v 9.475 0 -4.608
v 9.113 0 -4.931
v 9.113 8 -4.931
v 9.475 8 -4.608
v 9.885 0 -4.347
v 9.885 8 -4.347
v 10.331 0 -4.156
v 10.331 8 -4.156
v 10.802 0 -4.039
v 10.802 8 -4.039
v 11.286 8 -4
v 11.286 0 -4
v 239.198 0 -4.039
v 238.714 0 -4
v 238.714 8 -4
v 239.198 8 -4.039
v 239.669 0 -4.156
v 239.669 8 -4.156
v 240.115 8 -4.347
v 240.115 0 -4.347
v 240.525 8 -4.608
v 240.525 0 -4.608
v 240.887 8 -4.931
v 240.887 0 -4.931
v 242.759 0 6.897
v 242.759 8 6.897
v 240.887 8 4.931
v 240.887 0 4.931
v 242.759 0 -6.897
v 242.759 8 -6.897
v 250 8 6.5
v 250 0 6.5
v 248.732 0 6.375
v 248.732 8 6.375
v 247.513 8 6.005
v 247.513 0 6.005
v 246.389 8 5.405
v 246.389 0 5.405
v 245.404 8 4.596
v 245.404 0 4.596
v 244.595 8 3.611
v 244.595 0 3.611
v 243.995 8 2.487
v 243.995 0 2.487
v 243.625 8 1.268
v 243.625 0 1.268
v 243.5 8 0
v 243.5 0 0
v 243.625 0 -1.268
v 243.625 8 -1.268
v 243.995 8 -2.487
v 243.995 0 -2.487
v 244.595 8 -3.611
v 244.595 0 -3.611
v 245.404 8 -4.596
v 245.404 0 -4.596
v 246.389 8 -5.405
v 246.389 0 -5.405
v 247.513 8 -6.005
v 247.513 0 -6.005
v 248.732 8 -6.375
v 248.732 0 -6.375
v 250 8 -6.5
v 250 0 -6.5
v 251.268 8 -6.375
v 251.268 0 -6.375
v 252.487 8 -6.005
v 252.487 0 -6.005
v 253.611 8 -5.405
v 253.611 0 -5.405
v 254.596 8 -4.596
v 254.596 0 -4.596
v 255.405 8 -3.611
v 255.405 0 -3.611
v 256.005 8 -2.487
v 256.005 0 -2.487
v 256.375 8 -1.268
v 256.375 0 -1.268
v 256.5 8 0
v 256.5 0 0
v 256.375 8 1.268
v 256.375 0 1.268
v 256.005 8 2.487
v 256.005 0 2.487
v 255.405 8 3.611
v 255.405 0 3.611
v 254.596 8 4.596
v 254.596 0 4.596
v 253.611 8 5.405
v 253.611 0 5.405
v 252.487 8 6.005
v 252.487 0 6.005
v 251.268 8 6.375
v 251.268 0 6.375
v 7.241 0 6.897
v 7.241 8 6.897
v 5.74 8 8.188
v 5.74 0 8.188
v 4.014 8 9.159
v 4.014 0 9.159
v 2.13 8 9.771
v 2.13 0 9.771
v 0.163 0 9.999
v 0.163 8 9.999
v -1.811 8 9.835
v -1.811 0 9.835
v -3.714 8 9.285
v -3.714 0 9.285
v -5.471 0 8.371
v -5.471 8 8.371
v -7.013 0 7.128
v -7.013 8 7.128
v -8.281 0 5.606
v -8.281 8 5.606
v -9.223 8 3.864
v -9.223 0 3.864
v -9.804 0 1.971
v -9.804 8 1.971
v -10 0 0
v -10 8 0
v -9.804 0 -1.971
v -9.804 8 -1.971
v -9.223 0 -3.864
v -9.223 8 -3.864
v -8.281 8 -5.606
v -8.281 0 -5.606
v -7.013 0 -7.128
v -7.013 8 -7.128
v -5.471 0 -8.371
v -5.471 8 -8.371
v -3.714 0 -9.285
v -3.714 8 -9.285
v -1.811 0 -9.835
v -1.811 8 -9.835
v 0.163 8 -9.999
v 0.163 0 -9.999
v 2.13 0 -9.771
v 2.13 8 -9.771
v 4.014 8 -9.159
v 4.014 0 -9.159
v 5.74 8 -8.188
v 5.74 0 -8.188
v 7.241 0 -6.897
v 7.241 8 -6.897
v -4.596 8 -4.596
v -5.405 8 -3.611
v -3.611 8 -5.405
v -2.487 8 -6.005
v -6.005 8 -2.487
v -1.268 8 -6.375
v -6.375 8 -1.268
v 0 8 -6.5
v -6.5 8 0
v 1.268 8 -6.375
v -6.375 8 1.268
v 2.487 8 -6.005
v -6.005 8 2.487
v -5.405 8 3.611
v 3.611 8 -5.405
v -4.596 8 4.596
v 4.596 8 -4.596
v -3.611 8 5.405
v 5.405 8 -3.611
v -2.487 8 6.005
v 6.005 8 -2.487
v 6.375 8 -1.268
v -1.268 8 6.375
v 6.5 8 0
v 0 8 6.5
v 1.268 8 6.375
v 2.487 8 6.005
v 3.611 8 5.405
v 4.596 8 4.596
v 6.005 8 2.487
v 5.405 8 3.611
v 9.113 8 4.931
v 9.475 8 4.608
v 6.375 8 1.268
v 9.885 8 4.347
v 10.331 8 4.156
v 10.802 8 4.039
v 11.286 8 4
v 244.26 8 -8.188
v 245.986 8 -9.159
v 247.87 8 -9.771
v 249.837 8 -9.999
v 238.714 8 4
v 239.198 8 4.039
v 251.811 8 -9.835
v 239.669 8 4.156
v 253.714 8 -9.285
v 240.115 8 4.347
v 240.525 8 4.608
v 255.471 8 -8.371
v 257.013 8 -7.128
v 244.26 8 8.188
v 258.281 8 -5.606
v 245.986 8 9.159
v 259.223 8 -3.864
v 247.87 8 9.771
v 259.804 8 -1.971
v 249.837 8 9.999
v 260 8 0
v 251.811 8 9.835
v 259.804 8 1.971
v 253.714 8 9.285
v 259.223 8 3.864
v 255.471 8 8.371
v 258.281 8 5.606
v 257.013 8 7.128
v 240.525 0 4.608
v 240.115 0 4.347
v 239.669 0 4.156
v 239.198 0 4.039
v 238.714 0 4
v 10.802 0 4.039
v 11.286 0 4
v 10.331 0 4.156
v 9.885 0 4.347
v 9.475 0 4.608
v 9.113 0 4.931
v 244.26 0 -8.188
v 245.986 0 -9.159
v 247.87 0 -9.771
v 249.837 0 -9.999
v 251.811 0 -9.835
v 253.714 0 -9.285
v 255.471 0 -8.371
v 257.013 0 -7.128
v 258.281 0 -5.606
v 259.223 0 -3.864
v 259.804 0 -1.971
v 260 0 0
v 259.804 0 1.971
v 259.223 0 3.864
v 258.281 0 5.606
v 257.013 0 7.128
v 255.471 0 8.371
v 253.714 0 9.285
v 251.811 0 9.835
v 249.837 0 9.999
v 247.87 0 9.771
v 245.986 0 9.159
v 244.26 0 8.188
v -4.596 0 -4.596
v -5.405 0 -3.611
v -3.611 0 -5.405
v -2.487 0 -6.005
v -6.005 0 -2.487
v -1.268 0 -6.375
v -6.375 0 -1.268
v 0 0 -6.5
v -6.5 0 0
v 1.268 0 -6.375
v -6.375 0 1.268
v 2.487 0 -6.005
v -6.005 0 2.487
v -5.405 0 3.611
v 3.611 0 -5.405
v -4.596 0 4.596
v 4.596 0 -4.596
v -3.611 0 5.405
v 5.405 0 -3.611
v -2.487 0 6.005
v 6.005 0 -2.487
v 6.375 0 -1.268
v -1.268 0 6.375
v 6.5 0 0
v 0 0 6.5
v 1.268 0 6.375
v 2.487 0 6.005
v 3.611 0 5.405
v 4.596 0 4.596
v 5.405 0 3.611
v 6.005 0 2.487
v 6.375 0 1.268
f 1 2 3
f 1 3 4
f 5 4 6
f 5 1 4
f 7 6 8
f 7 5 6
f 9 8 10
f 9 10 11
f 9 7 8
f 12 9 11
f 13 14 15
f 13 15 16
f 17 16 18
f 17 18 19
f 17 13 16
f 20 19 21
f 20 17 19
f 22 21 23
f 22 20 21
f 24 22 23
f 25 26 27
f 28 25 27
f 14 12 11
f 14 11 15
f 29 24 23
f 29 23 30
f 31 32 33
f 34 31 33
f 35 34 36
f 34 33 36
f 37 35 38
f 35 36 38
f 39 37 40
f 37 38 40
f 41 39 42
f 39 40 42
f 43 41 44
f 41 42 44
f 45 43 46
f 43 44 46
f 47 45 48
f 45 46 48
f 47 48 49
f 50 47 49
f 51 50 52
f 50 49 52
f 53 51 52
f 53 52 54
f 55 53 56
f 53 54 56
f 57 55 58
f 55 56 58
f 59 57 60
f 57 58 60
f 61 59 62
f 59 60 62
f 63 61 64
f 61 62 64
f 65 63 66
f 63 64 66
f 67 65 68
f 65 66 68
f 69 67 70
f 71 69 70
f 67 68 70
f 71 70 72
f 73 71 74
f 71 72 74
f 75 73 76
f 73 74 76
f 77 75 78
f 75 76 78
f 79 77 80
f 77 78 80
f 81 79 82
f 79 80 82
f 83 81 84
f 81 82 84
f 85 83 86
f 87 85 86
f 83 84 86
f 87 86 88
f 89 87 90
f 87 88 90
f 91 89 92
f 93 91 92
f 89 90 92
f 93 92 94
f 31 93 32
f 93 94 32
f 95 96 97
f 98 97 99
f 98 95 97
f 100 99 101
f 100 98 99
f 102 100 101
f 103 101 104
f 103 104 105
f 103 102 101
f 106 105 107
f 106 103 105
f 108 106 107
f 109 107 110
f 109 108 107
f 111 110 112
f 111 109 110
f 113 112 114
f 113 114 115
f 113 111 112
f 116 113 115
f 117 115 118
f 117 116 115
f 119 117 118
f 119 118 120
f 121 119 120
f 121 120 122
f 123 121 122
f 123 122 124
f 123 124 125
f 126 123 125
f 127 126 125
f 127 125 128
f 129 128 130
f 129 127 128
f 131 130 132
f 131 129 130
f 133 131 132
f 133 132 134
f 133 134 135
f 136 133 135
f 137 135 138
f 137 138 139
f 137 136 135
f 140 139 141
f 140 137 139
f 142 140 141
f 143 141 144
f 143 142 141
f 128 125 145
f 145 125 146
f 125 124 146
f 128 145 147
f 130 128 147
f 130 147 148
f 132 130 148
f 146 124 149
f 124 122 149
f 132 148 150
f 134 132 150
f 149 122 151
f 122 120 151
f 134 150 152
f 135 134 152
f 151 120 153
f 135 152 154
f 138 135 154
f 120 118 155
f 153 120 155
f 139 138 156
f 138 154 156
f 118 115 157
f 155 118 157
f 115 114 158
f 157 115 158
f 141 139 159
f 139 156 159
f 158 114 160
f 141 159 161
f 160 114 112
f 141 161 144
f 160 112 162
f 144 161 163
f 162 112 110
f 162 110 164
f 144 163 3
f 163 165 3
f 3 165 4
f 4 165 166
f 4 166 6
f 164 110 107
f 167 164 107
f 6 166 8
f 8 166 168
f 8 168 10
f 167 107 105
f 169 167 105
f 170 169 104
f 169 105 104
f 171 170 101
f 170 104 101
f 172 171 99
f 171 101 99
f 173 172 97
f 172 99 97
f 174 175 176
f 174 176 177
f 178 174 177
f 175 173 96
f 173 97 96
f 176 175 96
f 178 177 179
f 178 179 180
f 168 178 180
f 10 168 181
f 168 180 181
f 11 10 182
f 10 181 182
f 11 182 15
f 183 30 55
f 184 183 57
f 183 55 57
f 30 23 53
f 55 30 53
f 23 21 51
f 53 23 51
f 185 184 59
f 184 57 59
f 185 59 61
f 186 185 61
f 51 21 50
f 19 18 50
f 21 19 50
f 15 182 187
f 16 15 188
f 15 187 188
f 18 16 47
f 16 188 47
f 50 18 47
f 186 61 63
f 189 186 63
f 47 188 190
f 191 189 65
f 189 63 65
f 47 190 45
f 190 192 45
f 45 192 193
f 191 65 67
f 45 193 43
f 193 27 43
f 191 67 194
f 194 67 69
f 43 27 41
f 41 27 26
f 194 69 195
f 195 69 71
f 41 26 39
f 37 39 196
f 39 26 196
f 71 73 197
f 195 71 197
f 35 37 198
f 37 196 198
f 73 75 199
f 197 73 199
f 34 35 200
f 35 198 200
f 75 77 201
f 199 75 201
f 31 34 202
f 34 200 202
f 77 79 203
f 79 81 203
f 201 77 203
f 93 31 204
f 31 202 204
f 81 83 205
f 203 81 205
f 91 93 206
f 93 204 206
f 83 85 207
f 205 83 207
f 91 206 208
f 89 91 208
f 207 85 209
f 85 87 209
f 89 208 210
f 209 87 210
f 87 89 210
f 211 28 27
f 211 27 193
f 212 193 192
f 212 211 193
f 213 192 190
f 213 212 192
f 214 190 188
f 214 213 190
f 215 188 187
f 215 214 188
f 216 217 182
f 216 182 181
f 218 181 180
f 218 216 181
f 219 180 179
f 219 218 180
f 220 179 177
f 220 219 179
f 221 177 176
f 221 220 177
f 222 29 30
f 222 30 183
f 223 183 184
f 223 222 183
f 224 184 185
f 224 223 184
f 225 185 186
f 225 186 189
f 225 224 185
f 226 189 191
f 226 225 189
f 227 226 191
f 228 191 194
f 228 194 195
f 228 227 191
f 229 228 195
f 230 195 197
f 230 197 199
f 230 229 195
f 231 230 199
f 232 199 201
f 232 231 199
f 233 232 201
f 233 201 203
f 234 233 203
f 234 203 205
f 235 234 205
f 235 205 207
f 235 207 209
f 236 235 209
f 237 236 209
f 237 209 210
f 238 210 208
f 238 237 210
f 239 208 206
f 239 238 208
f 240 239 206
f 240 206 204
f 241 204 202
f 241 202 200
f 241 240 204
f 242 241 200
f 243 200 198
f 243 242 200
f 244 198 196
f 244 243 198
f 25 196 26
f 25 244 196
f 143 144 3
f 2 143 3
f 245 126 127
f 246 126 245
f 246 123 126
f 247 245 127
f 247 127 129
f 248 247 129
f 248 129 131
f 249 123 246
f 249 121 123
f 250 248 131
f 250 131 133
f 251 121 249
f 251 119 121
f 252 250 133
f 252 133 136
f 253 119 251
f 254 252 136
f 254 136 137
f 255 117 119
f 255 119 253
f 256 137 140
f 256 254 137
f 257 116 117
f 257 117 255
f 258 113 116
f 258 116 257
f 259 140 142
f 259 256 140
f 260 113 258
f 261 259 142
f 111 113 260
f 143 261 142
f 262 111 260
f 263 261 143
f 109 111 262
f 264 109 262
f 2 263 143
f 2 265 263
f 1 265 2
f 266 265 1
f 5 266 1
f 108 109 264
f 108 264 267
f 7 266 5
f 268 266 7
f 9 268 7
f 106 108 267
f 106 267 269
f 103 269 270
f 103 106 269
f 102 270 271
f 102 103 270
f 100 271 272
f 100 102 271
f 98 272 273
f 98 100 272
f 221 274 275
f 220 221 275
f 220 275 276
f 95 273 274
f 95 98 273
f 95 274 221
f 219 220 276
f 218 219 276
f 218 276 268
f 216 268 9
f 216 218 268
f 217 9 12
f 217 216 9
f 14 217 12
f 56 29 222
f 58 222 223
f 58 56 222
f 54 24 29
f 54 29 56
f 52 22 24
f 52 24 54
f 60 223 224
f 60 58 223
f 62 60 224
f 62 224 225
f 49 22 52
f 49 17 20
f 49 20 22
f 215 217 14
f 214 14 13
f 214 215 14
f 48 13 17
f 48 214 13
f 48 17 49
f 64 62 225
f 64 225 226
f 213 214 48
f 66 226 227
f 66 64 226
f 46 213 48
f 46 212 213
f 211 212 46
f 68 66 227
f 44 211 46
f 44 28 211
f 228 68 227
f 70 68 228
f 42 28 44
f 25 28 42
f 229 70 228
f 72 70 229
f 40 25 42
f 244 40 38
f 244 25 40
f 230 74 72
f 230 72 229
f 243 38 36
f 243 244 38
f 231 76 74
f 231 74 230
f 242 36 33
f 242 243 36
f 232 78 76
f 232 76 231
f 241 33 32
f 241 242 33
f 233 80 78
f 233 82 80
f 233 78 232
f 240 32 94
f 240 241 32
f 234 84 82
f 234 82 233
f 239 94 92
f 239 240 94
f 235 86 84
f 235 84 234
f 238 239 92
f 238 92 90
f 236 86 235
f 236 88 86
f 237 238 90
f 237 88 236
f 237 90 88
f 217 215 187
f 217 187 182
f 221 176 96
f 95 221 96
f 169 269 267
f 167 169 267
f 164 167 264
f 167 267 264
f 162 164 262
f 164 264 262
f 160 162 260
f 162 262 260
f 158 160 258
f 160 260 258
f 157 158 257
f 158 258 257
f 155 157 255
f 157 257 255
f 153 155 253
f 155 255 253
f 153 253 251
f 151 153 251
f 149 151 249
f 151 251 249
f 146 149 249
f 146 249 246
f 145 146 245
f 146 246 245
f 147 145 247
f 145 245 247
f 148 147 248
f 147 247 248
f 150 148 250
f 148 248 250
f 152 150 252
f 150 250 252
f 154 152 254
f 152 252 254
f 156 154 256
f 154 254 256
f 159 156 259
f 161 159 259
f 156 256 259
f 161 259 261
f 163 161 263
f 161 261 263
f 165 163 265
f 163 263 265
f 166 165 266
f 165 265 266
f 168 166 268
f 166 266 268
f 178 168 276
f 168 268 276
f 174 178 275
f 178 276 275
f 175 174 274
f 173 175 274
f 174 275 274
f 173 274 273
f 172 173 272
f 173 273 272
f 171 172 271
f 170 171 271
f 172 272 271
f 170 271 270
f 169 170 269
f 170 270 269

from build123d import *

# Parameters (mm, degrees)
SKETCH_1_R      = 6.5
EXTRUDE_1_DEPTH = 8


with BuildPart() as part:
    # Эскиз1 → Бобышка-Вытянуть1 (new body)
    with BuildSketch(Plane.XZ):
        with BuildLine():
            Line((7.24137931, -6.896551724), (9.113300493, -4.931034483))
            ThreePointArc((9.113300493, -4.931034483), (10.10395639, -4.24256491), (11.285714286, -4))
            Line((11.285714286, -4), (238.714285714, -4))
            ThreePointArc((238.714285714, -4), (239.89604361, -4.24256491), (240.886699507, -4.931034483))
            Line((240.886699507, -4.931034483), (242.75862069, -6.896551724))
            ThreePointArc((242.75862069, -6.896551724), (260, 0), (242.75862069, 6.896551724))
            Line((242.75862069, 6.896551724), (240.886699507, 4.931034483))
            ThreePointArc((240.886699507, 4.931034483), (239.89604361, 4.24256491), (238.714285714, 4))
            Line((238.714285714, 4), (11.285714286, 4))
            ThreePointArc((11.285714286, 4), (10.10395639, 4.24256491), (9.113300493, 4.931034483))
            Line((9.113300493, 4.931034483), (7.24137931, 6.896551724))
            ThreePointArc((7.24137931, 6.896551724), (-10, 0), (7.24137931, -6.896551724))
        make_face()
        with Locations(Location((0, 0, 0), (0, 0, 90))):
            Circle(SKETCH_1_R, mode=Mode.SUBTRACT)
        with Locations(Location((250, 0, 0), (0, 0, 90))):
            Circle(SKETCH_1_R, mode=Mode.SUBTRACT)
    extrude(amount=-EXTRUDE_1_DEPTH)


solid = part.part
